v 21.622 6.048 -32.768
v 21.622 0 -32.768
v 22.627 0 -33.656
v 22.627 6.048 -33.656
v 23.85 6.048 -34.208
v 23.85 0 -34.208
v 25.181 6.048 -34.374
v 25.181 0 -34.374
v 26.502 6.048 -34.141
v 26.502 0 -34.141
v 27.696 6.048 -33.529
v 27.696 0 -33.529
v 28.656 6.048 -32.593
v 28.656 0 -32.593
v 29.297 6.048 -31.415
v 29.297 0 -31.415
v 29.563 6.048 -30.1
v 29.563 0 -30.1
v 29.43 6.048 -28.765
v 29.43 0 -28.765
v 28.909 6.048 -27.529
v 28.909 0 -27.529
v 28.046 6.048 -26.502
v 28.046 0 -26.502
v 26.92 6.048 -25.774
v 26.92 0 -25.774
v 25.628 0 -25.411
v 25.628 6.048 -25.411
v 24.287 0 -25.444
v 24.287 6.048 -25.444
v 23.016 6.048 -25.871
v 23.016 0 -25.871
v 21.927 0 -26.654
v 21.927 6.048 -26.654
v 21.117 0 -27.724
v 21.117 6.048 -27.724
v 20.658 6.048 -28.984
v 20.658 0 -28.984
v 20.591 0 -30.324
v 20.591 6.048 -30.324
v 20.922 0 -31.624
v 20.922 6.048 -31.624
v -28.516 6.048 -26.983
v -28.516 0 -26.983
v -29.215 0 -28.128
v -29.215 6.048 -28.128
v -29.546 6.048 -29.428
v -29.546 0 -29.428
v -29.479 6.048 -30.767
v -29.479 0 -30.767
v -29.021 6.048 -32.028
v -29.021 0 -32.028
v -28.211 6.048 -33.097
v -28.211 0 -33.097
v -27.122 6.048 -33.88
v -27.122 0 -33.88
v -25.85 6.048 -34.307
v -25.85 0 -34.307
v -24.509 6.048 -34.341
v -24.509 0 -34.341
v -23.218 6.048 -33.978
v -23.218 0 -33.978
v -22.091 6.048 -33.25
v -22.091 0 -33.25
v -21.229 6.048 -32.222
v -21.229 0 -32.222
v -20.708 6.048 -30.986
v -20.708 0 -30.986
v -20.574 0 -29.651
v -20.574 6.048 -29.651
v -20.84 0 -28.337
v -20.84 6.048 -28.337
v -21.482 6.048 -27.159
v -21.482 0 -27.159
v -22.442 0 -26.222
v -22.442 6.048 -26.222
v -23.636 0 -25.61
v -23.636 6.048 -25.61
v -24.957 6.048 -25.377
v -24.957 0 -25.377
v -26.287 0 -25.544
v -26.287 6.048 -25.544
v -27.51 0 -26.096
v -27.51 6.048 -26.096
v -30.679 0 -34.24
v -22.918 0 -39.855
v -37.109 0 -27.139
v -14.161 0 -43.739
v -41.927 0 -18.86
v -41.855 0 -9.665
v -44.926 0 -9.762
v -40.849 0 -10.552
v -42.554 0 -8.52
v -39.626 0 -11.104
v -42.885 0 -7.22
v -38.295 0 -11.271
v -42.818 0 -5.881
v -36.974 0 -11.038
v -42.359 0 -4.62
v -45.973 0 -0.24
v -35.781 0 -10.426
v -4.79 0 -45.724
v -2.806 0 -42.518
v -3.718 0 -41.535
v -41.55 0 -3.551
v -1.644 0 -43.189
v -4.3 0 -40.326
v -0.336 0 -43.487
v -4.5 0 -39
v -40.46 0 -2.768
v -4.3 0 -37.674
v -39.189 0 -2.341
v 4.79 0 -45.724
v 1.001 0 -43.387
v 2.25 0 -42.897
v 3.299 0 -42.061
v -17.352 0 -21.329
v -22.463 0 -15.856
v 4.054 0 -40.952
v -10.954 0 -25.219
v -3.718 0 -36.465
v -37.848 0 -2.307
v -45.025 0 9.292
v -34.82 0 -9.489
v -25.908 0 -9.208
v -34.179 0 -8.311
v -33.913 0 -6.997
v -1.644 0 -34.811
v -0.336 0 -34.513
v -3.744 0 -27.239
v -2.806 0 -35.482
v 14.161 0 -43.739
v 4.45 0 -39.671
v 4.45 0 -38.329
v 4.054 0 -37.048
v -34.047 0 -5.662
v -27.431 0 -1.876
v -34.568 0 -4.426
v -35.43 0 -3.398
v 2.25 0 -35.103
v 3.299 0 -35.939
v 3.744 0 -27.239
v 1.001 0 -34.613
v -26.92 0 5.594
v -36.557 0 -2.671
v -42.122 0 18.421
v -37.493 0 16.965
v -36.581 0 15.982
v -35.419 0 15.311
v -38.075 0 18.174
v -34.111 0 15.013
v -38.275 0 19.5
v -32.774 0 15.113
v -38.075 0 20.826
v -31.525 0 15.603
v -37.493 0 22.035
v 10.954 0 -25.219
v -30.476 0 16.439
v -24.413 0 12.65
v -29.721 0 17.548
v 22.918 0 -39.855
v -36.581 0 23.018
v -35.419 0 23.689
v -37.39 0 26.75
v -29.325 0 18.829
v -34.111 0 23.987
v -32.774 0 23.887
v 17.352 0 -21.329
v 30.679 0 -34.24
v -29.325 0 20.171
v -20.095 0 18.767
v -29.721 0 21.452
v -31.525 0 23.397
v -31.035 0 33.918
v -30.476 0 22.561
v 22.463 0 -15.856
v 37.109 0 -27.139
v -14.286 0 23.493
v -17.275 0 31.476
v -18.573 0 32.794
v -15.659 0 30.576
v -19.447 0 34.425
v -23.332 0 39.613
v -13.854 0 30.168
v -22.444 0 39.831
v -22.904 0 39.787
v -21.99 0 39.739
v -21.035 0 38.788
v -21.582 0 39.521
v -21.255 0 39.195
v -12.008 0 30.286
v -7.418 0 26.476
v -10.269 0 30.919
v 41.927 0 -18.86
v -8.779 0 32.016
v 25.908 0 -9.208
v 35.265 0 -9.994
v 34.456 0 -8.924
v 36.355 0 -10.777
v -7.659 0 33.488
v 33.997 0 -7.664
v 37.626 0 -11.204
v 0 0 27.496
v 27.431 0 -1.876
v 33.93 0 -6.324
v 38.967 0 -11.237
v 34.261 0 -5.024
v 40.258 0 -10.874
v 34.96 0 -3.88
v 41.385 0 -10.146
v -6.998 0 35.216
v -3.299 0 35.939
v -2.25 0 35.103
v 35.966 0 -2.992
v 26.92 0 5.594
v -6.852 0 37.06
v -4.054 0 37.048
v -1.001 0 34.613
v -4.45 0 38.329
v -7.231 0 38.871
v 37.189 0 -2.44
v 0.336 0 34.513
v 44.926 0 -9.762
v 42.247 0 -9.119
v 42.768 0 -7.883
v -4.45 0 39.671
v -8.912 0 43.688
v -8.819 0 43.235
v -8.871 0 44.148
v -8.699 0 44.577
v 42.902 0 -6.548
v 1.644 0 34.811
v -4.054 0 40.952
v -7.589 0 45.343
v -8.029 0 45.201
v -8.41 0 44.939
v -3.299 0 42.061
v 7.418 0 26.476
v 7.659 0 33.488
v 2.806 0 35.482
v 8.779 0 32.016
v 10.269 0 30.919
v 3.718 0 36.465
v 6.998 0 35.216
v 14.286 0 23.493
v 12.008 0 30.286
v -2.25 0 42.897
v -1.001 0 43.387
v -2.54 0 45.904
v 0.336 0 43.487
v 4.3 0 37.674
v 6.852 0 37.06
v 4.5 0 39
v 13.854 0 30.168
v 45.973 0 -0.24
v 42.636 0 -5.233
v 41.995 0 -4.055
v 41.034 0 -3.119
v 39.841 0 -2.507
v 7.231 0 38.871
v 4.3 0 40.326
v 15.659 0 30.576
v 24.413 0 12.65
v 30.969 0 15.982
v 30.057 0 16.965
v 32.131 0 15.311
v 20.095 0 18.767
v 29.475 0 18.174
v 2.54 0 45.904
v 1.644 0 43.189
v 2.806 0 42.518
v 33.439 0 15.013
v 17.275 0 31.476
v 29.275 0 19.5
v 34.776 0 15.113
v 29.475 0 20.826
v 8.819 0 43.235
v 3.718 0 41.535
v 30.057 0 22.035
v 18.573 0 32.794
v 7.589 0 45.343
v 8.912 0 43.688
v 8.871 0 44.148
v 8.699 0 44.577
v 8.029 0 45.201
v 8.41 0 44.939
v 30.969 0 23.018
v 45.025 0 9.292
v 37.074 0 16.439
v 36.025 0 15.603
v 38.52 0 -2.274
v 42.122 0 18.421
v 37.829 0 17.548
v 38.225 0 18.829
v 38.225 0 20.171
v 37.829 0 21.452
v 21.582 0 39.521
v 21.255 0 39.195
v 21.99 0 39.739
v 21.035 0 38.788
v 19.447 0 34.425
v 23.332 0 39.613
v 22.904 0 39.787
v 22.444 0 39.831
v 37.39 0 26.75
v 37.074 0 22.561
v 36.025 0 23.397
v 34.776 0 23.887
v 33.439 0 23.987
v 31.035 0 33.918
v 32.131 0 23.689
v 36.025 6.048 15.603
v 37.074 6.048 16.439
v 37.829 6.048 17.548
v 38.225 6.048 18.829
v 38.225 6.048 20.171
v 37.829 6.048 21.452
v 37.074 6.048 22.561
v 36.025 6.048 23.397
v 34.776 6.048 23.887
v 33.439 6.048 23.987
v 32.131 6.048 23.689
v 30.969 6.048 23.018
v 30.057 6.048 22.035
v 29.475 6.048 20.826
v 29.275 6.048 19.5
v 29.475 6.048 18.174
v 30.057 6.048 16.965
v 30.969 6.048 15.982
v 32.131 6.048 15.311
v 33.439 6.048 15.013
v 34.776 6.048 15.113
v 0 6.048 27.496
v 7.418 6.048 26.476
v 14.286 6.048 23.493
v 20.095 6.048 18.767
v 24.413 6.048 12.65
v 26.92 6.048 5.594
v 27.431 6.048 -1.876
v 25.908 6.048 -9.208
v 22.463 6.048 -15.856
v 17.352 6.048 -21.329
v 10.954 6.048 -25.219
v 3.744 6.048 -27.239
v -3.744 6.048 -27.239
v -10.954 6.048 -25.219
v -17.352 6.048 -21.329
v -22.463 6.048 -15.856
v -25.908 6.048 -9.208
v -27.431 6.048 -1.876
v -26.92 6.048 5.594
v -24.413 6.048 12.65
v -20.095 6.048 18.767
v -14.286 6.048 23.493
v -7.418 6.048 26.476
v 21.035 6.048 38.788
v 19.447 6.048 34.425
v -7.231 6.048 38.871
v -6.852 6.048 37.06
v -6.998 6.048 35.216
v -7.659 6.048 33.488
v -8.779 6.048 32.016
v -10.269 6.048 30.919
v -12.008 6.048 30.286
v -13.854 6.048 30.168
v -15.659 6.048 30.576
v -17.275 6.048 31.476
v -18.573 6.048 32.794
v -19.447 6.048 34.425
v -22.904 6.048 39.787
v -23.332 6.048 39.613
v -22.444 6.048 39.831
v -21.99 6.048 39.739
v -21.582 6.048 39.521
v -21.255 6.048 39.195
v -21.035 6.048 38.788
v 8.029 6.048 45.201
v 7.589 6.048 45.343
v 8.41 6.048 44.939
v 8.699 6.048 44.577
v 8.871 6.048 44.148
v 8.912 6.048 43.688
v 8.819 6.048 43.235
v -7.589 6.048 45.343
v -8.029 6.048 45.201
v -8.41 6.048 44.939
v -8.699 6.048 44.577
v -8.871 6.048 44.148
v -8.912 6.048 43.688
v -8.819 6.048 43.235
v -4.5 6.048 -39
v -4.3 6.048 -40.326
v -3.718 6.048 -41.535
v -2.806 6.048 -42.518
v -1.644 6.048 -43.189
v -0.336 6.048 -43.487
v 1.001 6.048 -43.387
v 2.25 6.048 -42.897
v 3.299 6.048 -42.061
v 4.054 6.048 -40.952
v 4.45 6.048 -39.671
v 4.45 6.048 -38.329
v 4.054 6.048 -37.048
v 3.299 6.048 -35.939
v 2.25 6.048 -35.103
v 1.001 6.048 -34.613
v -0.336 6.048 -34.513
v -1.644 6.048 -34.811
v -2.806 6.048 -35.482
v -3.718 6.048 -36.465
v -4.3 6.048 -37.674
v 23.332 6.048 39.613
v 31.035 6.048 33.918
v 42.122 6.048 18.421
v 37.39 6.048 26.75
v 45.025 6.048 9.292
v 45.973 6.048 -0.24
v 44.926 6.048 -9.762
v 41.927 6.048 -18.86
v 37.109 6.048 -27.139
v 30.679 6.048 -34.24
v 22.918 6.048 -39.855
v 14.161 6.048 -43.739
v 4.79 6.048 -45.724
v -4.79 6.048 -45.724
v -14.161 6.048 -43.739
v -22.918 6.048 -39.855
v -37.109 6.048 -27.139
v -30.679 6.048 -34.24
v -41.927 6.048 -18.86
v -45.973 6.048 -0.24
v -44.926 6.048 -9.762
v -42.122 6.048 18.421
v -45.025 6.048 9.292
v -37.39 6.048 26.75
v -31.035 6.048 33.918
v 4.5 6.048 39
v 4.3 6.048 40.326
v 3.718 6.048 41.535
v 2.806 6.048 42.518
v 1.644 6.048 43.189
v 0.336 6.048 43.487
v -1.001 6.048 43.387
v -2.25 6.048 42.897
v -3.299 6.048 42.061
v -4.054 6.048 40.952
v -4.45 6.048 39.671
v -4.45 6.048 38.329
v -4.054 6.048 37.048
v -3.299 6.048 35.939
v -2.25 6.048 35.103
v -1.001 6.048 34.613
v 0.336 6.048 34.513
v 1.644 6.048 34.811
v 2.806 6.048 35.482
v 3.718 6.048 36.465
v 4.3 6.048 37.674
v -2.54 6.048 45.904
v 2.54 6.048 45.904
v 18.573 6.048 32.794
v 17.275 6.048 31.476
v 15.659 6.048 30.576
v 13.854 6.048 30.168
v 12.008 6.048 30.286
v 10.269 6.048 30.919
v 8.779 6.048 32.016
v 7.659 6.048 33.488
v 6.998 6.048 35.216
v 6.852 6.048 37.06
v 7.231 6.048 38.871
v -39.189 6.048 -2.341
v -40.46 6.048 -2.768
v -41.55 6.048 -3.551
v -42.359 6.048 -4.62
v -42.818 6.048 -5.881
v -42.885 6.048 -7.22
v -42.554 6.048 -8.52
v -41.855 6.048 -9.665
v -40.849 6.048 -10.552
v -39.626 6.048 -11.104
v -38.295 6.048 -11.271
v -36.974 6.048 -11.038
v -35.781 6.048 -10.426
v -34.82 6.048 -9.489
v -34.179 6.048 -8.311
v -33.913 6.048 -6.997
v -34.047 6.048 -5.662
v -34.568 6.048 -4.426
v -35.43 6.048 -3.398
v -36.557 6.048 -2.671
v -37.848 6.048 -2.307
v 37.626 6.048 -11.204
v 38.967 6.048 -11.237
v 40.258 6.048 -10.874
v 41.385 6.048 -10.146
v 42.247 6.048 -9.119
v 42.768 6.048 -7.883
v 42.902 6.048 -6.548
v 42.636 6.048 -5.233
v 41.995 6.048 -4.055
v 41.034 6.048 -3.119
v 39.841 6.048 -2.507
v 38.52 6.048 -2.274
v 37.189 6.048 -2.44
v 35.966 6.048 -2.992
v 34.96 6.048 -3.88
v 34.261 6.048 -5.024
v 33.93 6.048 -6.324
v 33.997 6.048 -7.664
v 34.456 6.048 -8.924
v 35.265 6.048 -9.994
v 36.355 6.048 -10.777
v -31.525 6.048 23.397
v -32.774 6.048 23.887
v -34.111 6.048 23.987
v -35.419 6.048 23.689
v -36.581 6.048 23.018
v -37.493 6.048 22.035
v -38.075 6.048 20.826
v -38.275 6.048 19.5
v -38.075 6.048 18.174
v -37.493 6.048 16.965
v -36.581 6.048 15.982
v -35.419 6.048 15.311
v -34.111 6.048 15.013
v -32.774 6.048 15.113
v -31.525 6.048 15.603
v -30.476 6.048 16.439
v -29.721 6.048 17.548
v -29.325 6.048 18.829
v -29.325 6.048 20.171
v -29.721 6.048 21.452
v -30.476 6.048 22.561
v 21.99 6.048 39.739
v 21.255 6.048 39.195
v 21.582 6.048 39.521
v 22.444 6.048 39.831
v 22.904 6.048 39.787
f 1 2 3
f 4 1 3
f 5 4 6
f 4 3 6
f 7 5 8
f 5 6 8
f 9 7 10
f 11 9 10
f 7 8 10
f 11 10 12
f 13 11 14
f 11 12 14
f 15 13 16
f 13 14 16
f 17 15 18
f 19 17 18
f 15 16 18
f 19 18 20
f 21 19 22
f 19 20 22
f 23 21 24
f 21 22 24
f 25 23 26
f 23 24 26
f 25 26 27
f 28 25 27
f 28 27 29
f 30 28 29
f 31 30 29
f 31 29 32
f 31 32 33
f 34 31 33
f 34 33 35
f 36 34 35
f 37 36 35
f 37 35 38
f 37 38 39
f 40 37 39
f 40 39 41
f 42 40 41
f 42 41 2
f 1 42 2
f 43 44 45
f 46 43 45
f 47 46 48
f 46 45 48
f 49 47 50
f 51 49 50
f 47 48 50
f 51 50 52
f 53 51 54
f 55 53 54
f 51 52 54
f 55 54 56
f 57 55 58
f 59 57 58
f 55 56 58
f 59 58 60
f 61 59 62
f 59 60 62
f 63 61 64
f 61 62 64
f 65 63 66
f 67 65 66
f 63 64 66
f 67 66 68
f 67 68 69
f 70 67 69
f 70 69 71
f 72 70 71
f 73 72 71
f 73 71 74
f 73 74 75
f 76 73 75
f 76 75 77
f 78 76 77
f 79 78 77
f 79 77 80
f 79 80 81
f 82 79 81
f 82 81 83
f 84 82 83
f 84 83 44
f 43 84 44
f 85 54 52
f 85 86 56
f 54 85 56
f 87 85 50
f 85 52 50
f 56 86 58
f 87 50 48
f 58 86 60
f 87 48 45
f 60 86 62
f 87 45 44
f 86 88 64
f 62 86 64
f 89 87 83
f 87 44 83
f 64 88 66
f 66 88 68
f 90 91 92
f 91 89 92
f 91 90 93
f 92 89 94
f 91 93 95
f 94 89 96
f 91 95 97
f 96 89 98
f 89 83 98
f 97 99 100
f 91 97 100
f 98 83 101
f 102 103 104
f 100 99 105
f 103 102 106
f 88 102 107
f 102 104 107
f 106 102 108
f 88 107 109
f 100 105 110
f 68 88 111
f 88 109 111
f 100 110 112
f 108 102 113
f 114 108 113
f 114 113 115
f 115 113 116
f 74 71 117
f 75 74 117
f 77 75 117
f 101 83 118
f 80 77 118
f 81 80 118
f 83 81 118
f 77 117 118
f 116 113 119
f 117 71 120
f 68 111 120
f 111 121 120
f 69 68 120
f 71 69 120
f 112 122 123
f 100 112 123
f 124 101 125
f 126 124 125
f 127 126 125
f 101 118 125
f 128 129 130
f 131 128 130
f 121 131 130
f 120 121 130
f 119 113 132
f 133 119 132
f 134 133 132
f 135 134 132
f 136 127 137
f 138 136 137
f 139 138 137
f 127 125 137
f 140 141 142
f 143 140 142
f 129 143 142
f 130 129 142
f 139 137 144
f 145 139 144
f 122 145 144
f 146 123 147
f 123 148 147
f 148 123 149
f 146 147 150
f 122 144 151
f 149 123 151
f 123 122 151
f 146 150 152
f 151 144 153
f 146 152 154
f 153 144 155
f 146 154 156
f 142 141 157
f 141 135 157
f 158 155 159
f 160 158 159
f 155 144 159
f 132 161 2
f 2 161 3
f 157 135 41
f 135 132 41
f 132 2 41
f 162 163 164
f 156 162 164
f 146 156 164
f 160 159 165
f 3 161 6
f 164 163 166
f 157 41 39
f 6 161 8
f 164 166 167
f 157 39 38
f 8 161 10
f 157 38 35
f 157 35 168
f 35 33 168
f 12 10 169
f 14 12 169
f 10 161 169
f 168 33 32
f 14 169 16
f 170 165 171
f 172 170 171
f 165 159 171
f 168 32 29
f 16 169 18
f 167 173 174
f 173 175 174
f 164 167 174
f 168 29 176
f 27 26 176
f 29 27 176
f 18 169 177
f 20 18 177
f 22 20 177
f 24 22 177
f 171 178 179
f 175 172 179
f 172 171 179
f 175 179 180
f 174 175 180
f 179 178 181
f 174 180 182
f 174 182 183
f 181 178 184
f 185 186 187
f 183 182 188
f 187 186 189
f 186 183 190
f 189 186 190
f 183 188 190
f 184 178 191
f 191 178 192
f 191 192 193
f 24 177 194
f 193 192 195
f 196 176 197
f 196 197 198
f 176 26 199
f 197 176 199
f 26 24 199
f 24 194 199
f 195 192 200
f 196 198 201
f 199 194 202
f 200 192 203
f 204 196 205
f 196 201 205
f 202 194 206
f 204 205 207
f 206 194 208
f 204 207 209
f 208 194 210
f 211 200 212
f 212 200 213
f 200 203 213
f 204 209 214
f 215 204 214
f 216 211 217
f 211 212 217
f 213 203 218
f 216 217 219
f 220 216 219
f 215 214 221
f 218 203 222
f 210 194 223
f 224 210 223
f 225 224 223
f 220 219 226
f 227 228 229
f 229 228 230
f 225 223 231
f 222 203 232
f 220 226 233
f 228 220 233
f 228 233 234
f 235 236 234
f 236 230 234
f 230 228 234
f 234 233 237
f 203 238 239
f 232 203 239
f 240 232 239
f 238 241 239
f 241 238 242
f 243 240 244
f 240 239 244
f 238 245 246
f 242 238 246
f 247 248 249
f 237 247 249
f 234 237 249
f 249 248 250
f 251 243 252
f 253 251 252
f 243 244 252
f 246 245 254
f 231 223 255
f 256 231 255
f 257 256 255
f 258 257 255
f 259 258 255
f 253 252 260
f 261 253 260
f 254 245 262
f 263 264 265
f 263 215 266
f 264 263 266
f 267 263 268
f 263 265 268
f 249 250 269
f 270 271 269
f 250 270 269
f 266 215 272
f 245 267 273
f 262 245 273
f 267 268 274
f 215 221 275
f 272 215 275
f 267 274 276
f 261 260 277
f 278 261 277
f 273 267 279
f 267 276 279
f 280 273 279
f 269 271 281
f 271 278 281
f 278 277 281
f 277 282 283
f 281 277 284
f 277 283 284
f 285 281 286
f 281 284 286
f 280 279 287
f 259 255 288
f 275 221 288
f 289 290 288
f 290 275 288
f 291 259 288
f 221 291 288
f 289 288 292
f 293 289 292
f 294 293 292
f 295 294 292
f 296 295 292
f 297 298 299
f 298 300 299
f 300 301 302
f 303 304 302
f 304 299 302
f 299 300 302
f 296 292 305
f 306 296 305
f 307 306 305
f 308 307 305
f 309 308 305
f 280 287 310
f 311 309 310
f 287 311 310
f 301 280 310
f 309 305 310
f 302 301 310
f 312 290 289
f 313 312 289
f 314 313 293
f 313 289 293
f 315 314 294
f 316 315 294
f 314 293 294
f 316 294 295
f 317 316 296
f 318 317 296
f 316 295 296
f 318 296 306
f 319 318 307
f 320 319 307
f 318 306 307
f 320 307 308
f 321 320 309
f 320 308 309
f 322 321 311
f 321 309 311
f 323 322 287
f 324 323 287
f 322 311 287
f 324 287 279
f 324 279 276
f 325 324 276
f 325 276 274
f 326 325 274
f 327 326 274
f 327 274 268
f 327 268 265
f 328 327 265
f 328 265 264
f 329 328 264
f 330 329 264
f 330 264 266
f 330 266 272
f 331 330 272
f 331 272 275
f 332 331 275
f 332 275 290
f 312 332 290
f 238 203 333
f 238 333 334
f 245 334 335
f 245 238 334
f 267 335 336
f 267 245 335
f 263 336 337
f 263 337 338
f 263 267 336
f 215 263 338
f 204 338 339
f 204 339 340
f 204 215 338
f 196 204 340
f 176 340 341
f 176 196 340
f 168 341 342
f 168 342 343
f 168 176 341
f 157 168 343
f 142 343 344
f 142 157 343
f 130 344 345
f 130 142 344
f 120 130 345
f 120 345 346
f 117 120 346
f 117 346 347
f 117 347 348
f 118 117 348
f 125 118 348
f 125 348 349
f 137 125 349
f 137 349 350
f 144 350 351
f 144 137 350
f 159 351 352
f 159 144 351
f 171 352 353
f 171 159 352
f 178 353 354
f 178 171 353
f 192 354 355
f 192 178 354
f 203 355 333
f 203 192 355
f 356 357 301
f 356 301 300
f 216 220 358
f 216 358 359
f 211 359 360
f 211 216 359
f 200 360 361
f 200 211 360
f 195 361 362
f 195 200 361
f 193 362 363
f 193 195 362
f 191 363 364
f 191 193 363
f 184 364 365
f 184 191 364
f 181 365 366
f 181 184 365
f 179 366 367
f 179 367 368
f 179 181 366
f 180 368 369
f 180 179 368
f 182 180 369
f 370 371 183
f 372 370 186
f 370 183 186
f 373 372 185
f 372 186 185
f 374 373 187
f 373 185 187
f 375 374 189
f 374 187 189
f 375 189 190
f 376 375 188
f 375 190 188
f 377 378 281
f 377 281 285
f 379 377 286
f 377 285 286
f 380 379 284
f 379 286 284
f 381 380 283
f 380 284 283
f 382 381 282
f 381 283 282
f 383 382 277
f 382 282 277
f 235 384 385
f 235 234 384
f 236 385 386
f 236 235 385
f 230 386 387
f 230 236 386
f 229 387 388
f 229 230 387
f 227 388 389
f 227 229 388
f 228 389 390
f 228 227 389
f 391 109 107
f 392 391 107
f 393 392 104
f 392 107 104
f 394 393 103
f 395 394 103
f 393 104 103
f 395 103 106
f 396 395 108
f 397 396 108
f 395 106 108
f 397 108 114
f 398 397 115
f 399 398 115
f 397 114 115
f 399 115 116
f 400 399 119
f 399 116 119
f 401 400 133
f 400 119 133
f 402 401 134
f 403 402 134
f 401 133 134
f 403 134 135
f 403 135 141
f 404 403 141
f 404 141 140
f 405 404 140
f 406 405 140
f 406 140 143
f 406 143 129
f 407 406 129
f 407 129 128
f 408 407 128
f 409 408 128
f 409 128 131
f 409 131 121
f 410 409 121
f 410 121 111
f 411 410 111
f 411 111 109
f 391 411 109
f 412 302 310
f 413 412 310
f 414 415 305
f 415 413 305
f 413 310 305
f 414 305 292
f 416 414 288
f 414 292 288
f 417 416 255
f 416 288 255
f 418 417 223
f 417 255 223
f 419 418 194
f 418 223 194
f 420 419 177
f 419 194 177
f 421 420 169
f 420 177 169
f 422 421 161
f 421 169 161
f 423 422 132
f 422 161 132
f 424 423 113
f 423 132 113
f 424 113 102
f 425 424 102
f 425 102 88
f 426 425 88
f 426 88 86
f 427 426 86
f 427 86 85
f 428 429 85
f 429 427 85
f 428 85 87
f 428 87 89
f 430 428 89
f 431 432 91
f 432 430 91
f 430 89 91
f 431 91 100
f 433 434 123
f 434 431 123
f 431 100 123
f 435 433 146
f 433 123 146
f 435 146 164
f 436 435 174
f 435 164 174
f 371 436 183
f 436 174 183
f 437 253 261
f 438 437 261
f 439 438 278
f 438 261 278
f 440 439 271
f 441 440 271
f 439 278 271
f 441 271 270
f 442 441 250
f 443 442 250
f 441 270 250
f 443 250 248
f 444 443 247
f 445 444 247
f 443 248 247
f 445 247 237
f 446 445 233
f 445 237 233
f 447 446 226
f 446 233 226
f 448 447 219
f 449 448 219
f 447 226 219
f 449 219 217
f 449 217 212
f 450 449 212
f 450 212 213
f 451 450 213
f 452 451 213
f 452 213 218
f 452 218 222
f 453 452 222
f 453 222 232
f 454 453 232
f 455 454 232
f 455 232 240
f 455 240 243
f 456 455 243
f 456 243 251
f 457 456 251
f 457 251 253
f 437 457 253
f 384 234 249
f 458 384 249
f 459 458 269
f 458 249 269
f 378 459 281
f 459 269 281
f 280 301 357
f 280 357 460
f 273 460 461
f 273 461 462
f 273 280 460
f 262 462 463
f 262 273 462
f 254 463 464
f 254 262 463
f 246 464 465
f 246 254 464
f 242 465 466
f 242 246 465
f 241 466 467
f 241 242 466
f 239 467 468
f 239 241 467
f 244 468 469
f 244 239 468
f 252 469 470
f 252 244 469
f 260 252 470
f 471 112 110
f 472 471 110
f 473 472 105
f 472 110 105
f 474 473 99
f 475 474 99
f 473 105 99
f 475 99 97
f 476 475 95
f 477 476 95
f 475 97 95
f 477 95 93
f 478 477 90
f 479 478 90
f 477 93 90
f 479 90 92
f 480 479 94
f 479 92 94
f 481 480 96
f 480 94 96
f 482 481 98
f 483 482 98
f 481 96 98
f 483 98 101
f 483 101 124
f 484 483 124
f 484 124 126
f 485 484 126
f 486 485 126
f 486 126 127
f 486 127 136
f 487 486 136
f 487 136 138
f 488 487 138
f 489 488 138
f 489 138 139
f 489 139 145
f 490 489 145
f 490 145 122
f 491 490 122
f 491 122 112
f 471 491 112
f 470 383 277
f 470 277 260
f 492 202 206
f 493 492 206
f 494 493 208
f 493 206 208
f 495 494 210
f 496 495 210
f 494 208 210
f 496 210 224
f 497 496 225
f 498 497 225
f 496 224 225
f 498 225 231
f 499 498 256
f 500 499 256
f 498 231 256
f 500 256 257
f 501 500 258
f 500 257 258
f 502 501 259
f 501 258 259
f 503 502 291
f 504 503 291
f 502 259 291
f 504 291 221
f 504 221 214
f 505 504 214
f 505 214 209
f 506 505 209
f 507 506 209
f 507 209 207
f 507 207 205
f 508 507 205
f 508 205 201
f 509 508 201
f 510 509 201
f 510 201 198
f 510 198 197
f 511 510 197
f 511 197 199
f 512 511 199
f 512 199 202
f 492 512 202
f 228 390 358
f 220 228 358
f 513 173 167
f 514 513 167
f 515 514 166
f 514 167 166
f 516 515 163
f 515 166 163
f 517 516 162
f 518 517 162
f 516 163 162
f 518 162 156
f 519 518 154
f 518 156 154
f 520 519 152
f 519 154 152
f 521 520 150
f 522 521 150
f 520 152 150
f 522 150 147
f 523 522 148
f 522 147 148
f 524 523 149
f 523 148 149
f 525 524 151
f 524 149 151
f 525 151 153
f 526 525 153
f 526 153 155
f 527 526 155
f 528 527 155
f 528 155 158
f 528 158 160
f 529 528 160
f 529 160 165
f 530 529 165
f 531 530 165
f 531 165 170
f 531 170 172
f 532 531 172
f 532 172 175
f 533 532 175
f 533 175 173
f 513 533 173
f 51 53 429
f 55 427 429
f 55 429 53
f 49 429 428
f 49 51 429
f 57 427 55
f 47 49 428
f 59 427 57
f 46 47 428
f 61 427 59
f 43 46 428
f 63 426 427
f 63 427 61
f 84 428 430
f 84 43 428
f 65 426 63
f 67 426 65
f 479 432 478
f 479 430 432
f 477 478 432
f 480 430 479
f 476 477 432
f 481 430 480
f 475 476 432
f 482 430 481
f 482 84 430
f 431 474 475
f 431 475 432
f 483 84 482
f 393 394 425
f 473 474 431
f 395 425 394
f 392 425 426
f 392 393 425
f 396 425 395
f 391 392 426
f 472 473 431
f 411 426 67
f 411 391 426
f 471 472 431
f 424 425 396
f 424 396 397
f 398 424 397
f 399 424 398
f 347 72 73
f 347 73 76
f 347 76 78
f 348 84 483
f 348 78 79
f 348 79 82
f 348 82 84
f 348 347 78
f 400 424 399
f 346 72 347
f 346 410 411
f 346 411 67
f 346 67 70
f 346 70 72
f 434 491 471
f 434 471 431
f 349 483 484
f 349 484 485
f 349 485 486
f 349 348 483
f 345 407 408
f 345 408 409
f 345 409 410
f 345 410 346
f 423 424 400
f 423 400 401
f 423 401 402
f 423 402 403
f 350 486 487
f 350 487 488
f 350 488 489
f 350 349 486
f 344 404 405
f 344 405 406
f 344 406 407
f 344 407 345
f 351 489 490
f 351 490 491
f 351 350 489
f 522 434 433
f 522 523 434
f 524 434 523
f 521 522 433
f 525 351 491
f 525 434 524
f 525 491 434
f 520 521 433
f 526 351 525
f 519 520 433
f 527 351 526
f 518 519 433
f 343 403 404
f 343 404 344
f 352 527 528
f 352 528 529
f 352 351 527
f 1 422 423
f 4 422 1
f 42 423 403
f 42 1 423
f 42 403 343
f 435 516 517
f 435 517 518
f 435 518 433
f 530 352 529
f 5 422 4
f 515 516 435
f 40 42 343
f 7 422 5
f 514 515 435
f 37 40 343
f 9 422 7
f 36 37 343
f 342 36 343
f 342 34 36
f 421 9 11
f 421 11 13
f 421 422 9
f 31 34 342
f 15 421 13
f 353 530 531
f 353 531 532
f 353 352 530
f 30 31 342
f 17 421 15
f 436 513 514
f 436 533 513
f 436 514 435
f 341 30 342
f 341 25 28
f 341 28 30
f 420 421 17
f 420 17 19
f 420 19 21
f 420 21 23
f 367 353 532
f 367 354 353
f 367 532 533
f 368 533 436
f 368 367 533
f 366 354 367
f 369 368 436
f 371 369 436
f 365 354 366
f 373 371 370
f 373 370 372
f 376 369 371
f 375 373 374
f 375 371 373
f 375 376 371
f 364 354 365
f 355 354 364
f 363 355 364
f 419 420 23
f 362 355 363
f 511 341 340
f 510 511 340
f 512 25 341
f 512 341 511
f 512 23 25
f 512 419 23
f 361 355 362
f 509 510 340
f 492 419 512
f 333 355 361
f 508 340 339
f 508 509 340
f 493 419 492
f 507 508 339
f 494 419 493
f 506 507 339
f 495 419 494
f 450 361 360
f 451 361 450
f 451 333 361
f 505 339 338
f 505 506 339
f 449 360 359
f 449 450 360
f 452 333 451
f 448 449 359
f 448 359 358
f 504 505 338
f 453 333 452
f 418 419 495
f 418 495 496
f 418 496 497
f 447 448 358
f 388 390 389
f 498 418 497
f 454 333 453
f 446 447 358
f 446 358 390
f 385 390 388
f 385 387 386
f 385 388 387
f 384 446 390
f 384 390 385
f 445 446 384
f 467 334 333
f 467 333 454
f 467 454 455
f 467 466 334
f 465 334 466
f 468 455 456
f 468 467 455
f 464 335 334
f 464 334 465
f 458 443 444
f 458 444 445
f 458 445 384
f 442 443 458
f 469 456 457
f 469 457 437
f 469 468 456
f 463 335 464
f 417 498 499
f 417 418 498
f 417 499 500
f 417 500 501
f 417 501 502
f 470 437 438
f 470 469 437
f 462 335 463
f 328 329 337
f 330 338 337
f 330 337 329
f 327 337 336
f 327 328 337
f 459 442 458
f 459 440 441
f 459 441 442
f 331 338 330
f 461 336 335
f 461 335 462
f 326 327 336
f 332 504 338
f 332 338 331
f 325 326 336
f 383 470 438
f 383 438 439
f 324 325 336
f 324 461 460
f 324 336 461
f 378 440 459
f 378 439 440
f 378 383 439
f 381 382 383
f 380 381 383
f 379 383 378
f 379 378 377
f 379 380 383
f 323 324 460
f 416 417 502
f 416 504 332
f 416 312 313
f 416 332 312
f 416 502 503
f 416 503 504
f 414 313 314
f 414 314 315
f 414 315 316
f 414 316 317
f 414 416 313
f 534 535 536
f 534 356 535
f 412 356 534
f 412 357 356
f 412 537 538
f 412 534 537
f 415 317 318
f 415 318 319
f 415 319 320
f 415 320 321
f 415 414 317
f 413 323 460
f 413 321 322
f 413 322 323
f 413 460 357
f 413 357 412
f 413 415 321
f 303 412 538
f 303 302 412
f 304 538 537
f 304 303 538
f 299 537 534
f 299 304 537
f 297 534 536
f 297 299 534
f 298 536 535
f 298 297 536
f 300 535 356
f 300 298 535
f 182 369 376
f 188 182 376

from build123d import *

# Parameters (mm, degrees)
SKETCH1_R            = 45.974
SKETCH1_R_2          = 27.4955
SKETCH1_R_3          = 6.5
BOSS_EXTRUDE1_DEPTH  = 6.04774
M8_CLEARANCE_HOLE1_D = 9
CIRPATTERN1_COUNT    = 18
CUT_EXTRUDE1_DEPTH   = 66.297722097
FILLET1_R            = 1.5875
FILLET1_OF_MIRROR1_R = 1.5875


with BuildPart() as part:
    # Sketch1 → Boss-Extrude1 (new body)
    with BuildSketch(Plane(origin=(0, 0, 0), x_dir=(1, 0, 0), z_dir=(0, 1, 0))):
        with Locations(Location((0, 0, 0), (0, 0, 270))):
            Circle(SKETCH1_R)
        with Locations(Location((0, 0, 0), (0, 0, 270))):
            Circle(SKETCH1_R_2, mode=Mode.SUBTRACT)
        with Locations(Location((-13.33878559, -36.648012211, 0), (0, 0, 270))):
            Circle(SKETCH1_R_3, mode=Mode.SUBTRACT)
        with Locations(Location((13.33878559, -36.648012211, 0), (0, 0, 270))):
            Circle(SKETCH1_R_3, mode=Mode.SUBTRACT)
    extrude(amount=BOSS_EXTRUDE1_DEPTH)

    # M8 Clearance Hole1 (through all)
    with Locations(Plane(origin=(0, 6.04774, 0), x_dir=(1, 0, 0), z_dir=(0, 1, 0))):
        with Locations((0, 39)):
            m8_clearance_hole1 = Hole(M8_CLEARANCE_HOLE1_D / 2)

    # CirPattern1: M8 Clearance Hole1 ×18 about axis, 10 skipped
    cirpattern1_axis = Axis((0, 6.04774, 0), (0, -1, 0))
    add([m8_clearance_hole1.rotate(cirpattern1_axis, i * 360 / CIRPATTERN1_COUNT) for i in range(1, CIRPATTERN1_COUNT) if i not in (1, 3, 5, 7, 8, 10, 11, 13, 15, 17)], mode=Mode.SUBTRACT)

    # Sketch6 → Cut-Extrude1 (cut, through all)
    with BuildSketch(Plane(origin=(0, 6.04774, 0), x_dir=(1, 0, 0), z_dir=(0, 1, 0))):
        with BuildLine():
            ThreePointArc((-7.230783555, -38.871143142), (-15.561916521, -42.756014246), (-19.446787625, -34.424881279))
            Line((-19.446787625, -34.424881279), (-21.674084917, -40.544330295))
            ThreePointArc((-21.674084917, -40.544330295), (-15.724034069, -43.201428548), (-9.458080846, -44.990592158))
            Line((-9.458080846, -44.990592158), (-7.230783555, -38.871143142))
        make_face()
    cut_extrude1 = extrude(amount=-CUT_EXTRUDE1_DEPTH, mode=Mode.SUBTRACT)

    # Fillet1
    fillet1_edges = [part.edges().sort_by_distance(p)[0] for p in [
        (-9.458080846, 3.02387, 44.990592158),
        (-21.674084917, 3.02387, 40.544330295),
    ]]
    fillet(fillet1_edges, radius=FILLET1_R)

    # Mirror1: Cut-Extrude1 across plane
    add(cut_extrude1.mirror(Plane(origin=(0, 0, 0), x_dir=(0, 0, 1), z_dir=(1, 0, 0))), mode=Mode.SUBTRACT)

    # Fillet1 of Mirror1
    fillet1_of_mirror1_edges = [part.edges().sort_by_distance(p)[0] for p in [
        (9.458080846, 3.02387, 44.990592158),
        (21.674084917, 3.02387, 40.544330295),
    ]]
    fillet(fillet1_of_mirror1_edges, radius=FILLET1_OF_MIRROR1_R)


solid = part.part
